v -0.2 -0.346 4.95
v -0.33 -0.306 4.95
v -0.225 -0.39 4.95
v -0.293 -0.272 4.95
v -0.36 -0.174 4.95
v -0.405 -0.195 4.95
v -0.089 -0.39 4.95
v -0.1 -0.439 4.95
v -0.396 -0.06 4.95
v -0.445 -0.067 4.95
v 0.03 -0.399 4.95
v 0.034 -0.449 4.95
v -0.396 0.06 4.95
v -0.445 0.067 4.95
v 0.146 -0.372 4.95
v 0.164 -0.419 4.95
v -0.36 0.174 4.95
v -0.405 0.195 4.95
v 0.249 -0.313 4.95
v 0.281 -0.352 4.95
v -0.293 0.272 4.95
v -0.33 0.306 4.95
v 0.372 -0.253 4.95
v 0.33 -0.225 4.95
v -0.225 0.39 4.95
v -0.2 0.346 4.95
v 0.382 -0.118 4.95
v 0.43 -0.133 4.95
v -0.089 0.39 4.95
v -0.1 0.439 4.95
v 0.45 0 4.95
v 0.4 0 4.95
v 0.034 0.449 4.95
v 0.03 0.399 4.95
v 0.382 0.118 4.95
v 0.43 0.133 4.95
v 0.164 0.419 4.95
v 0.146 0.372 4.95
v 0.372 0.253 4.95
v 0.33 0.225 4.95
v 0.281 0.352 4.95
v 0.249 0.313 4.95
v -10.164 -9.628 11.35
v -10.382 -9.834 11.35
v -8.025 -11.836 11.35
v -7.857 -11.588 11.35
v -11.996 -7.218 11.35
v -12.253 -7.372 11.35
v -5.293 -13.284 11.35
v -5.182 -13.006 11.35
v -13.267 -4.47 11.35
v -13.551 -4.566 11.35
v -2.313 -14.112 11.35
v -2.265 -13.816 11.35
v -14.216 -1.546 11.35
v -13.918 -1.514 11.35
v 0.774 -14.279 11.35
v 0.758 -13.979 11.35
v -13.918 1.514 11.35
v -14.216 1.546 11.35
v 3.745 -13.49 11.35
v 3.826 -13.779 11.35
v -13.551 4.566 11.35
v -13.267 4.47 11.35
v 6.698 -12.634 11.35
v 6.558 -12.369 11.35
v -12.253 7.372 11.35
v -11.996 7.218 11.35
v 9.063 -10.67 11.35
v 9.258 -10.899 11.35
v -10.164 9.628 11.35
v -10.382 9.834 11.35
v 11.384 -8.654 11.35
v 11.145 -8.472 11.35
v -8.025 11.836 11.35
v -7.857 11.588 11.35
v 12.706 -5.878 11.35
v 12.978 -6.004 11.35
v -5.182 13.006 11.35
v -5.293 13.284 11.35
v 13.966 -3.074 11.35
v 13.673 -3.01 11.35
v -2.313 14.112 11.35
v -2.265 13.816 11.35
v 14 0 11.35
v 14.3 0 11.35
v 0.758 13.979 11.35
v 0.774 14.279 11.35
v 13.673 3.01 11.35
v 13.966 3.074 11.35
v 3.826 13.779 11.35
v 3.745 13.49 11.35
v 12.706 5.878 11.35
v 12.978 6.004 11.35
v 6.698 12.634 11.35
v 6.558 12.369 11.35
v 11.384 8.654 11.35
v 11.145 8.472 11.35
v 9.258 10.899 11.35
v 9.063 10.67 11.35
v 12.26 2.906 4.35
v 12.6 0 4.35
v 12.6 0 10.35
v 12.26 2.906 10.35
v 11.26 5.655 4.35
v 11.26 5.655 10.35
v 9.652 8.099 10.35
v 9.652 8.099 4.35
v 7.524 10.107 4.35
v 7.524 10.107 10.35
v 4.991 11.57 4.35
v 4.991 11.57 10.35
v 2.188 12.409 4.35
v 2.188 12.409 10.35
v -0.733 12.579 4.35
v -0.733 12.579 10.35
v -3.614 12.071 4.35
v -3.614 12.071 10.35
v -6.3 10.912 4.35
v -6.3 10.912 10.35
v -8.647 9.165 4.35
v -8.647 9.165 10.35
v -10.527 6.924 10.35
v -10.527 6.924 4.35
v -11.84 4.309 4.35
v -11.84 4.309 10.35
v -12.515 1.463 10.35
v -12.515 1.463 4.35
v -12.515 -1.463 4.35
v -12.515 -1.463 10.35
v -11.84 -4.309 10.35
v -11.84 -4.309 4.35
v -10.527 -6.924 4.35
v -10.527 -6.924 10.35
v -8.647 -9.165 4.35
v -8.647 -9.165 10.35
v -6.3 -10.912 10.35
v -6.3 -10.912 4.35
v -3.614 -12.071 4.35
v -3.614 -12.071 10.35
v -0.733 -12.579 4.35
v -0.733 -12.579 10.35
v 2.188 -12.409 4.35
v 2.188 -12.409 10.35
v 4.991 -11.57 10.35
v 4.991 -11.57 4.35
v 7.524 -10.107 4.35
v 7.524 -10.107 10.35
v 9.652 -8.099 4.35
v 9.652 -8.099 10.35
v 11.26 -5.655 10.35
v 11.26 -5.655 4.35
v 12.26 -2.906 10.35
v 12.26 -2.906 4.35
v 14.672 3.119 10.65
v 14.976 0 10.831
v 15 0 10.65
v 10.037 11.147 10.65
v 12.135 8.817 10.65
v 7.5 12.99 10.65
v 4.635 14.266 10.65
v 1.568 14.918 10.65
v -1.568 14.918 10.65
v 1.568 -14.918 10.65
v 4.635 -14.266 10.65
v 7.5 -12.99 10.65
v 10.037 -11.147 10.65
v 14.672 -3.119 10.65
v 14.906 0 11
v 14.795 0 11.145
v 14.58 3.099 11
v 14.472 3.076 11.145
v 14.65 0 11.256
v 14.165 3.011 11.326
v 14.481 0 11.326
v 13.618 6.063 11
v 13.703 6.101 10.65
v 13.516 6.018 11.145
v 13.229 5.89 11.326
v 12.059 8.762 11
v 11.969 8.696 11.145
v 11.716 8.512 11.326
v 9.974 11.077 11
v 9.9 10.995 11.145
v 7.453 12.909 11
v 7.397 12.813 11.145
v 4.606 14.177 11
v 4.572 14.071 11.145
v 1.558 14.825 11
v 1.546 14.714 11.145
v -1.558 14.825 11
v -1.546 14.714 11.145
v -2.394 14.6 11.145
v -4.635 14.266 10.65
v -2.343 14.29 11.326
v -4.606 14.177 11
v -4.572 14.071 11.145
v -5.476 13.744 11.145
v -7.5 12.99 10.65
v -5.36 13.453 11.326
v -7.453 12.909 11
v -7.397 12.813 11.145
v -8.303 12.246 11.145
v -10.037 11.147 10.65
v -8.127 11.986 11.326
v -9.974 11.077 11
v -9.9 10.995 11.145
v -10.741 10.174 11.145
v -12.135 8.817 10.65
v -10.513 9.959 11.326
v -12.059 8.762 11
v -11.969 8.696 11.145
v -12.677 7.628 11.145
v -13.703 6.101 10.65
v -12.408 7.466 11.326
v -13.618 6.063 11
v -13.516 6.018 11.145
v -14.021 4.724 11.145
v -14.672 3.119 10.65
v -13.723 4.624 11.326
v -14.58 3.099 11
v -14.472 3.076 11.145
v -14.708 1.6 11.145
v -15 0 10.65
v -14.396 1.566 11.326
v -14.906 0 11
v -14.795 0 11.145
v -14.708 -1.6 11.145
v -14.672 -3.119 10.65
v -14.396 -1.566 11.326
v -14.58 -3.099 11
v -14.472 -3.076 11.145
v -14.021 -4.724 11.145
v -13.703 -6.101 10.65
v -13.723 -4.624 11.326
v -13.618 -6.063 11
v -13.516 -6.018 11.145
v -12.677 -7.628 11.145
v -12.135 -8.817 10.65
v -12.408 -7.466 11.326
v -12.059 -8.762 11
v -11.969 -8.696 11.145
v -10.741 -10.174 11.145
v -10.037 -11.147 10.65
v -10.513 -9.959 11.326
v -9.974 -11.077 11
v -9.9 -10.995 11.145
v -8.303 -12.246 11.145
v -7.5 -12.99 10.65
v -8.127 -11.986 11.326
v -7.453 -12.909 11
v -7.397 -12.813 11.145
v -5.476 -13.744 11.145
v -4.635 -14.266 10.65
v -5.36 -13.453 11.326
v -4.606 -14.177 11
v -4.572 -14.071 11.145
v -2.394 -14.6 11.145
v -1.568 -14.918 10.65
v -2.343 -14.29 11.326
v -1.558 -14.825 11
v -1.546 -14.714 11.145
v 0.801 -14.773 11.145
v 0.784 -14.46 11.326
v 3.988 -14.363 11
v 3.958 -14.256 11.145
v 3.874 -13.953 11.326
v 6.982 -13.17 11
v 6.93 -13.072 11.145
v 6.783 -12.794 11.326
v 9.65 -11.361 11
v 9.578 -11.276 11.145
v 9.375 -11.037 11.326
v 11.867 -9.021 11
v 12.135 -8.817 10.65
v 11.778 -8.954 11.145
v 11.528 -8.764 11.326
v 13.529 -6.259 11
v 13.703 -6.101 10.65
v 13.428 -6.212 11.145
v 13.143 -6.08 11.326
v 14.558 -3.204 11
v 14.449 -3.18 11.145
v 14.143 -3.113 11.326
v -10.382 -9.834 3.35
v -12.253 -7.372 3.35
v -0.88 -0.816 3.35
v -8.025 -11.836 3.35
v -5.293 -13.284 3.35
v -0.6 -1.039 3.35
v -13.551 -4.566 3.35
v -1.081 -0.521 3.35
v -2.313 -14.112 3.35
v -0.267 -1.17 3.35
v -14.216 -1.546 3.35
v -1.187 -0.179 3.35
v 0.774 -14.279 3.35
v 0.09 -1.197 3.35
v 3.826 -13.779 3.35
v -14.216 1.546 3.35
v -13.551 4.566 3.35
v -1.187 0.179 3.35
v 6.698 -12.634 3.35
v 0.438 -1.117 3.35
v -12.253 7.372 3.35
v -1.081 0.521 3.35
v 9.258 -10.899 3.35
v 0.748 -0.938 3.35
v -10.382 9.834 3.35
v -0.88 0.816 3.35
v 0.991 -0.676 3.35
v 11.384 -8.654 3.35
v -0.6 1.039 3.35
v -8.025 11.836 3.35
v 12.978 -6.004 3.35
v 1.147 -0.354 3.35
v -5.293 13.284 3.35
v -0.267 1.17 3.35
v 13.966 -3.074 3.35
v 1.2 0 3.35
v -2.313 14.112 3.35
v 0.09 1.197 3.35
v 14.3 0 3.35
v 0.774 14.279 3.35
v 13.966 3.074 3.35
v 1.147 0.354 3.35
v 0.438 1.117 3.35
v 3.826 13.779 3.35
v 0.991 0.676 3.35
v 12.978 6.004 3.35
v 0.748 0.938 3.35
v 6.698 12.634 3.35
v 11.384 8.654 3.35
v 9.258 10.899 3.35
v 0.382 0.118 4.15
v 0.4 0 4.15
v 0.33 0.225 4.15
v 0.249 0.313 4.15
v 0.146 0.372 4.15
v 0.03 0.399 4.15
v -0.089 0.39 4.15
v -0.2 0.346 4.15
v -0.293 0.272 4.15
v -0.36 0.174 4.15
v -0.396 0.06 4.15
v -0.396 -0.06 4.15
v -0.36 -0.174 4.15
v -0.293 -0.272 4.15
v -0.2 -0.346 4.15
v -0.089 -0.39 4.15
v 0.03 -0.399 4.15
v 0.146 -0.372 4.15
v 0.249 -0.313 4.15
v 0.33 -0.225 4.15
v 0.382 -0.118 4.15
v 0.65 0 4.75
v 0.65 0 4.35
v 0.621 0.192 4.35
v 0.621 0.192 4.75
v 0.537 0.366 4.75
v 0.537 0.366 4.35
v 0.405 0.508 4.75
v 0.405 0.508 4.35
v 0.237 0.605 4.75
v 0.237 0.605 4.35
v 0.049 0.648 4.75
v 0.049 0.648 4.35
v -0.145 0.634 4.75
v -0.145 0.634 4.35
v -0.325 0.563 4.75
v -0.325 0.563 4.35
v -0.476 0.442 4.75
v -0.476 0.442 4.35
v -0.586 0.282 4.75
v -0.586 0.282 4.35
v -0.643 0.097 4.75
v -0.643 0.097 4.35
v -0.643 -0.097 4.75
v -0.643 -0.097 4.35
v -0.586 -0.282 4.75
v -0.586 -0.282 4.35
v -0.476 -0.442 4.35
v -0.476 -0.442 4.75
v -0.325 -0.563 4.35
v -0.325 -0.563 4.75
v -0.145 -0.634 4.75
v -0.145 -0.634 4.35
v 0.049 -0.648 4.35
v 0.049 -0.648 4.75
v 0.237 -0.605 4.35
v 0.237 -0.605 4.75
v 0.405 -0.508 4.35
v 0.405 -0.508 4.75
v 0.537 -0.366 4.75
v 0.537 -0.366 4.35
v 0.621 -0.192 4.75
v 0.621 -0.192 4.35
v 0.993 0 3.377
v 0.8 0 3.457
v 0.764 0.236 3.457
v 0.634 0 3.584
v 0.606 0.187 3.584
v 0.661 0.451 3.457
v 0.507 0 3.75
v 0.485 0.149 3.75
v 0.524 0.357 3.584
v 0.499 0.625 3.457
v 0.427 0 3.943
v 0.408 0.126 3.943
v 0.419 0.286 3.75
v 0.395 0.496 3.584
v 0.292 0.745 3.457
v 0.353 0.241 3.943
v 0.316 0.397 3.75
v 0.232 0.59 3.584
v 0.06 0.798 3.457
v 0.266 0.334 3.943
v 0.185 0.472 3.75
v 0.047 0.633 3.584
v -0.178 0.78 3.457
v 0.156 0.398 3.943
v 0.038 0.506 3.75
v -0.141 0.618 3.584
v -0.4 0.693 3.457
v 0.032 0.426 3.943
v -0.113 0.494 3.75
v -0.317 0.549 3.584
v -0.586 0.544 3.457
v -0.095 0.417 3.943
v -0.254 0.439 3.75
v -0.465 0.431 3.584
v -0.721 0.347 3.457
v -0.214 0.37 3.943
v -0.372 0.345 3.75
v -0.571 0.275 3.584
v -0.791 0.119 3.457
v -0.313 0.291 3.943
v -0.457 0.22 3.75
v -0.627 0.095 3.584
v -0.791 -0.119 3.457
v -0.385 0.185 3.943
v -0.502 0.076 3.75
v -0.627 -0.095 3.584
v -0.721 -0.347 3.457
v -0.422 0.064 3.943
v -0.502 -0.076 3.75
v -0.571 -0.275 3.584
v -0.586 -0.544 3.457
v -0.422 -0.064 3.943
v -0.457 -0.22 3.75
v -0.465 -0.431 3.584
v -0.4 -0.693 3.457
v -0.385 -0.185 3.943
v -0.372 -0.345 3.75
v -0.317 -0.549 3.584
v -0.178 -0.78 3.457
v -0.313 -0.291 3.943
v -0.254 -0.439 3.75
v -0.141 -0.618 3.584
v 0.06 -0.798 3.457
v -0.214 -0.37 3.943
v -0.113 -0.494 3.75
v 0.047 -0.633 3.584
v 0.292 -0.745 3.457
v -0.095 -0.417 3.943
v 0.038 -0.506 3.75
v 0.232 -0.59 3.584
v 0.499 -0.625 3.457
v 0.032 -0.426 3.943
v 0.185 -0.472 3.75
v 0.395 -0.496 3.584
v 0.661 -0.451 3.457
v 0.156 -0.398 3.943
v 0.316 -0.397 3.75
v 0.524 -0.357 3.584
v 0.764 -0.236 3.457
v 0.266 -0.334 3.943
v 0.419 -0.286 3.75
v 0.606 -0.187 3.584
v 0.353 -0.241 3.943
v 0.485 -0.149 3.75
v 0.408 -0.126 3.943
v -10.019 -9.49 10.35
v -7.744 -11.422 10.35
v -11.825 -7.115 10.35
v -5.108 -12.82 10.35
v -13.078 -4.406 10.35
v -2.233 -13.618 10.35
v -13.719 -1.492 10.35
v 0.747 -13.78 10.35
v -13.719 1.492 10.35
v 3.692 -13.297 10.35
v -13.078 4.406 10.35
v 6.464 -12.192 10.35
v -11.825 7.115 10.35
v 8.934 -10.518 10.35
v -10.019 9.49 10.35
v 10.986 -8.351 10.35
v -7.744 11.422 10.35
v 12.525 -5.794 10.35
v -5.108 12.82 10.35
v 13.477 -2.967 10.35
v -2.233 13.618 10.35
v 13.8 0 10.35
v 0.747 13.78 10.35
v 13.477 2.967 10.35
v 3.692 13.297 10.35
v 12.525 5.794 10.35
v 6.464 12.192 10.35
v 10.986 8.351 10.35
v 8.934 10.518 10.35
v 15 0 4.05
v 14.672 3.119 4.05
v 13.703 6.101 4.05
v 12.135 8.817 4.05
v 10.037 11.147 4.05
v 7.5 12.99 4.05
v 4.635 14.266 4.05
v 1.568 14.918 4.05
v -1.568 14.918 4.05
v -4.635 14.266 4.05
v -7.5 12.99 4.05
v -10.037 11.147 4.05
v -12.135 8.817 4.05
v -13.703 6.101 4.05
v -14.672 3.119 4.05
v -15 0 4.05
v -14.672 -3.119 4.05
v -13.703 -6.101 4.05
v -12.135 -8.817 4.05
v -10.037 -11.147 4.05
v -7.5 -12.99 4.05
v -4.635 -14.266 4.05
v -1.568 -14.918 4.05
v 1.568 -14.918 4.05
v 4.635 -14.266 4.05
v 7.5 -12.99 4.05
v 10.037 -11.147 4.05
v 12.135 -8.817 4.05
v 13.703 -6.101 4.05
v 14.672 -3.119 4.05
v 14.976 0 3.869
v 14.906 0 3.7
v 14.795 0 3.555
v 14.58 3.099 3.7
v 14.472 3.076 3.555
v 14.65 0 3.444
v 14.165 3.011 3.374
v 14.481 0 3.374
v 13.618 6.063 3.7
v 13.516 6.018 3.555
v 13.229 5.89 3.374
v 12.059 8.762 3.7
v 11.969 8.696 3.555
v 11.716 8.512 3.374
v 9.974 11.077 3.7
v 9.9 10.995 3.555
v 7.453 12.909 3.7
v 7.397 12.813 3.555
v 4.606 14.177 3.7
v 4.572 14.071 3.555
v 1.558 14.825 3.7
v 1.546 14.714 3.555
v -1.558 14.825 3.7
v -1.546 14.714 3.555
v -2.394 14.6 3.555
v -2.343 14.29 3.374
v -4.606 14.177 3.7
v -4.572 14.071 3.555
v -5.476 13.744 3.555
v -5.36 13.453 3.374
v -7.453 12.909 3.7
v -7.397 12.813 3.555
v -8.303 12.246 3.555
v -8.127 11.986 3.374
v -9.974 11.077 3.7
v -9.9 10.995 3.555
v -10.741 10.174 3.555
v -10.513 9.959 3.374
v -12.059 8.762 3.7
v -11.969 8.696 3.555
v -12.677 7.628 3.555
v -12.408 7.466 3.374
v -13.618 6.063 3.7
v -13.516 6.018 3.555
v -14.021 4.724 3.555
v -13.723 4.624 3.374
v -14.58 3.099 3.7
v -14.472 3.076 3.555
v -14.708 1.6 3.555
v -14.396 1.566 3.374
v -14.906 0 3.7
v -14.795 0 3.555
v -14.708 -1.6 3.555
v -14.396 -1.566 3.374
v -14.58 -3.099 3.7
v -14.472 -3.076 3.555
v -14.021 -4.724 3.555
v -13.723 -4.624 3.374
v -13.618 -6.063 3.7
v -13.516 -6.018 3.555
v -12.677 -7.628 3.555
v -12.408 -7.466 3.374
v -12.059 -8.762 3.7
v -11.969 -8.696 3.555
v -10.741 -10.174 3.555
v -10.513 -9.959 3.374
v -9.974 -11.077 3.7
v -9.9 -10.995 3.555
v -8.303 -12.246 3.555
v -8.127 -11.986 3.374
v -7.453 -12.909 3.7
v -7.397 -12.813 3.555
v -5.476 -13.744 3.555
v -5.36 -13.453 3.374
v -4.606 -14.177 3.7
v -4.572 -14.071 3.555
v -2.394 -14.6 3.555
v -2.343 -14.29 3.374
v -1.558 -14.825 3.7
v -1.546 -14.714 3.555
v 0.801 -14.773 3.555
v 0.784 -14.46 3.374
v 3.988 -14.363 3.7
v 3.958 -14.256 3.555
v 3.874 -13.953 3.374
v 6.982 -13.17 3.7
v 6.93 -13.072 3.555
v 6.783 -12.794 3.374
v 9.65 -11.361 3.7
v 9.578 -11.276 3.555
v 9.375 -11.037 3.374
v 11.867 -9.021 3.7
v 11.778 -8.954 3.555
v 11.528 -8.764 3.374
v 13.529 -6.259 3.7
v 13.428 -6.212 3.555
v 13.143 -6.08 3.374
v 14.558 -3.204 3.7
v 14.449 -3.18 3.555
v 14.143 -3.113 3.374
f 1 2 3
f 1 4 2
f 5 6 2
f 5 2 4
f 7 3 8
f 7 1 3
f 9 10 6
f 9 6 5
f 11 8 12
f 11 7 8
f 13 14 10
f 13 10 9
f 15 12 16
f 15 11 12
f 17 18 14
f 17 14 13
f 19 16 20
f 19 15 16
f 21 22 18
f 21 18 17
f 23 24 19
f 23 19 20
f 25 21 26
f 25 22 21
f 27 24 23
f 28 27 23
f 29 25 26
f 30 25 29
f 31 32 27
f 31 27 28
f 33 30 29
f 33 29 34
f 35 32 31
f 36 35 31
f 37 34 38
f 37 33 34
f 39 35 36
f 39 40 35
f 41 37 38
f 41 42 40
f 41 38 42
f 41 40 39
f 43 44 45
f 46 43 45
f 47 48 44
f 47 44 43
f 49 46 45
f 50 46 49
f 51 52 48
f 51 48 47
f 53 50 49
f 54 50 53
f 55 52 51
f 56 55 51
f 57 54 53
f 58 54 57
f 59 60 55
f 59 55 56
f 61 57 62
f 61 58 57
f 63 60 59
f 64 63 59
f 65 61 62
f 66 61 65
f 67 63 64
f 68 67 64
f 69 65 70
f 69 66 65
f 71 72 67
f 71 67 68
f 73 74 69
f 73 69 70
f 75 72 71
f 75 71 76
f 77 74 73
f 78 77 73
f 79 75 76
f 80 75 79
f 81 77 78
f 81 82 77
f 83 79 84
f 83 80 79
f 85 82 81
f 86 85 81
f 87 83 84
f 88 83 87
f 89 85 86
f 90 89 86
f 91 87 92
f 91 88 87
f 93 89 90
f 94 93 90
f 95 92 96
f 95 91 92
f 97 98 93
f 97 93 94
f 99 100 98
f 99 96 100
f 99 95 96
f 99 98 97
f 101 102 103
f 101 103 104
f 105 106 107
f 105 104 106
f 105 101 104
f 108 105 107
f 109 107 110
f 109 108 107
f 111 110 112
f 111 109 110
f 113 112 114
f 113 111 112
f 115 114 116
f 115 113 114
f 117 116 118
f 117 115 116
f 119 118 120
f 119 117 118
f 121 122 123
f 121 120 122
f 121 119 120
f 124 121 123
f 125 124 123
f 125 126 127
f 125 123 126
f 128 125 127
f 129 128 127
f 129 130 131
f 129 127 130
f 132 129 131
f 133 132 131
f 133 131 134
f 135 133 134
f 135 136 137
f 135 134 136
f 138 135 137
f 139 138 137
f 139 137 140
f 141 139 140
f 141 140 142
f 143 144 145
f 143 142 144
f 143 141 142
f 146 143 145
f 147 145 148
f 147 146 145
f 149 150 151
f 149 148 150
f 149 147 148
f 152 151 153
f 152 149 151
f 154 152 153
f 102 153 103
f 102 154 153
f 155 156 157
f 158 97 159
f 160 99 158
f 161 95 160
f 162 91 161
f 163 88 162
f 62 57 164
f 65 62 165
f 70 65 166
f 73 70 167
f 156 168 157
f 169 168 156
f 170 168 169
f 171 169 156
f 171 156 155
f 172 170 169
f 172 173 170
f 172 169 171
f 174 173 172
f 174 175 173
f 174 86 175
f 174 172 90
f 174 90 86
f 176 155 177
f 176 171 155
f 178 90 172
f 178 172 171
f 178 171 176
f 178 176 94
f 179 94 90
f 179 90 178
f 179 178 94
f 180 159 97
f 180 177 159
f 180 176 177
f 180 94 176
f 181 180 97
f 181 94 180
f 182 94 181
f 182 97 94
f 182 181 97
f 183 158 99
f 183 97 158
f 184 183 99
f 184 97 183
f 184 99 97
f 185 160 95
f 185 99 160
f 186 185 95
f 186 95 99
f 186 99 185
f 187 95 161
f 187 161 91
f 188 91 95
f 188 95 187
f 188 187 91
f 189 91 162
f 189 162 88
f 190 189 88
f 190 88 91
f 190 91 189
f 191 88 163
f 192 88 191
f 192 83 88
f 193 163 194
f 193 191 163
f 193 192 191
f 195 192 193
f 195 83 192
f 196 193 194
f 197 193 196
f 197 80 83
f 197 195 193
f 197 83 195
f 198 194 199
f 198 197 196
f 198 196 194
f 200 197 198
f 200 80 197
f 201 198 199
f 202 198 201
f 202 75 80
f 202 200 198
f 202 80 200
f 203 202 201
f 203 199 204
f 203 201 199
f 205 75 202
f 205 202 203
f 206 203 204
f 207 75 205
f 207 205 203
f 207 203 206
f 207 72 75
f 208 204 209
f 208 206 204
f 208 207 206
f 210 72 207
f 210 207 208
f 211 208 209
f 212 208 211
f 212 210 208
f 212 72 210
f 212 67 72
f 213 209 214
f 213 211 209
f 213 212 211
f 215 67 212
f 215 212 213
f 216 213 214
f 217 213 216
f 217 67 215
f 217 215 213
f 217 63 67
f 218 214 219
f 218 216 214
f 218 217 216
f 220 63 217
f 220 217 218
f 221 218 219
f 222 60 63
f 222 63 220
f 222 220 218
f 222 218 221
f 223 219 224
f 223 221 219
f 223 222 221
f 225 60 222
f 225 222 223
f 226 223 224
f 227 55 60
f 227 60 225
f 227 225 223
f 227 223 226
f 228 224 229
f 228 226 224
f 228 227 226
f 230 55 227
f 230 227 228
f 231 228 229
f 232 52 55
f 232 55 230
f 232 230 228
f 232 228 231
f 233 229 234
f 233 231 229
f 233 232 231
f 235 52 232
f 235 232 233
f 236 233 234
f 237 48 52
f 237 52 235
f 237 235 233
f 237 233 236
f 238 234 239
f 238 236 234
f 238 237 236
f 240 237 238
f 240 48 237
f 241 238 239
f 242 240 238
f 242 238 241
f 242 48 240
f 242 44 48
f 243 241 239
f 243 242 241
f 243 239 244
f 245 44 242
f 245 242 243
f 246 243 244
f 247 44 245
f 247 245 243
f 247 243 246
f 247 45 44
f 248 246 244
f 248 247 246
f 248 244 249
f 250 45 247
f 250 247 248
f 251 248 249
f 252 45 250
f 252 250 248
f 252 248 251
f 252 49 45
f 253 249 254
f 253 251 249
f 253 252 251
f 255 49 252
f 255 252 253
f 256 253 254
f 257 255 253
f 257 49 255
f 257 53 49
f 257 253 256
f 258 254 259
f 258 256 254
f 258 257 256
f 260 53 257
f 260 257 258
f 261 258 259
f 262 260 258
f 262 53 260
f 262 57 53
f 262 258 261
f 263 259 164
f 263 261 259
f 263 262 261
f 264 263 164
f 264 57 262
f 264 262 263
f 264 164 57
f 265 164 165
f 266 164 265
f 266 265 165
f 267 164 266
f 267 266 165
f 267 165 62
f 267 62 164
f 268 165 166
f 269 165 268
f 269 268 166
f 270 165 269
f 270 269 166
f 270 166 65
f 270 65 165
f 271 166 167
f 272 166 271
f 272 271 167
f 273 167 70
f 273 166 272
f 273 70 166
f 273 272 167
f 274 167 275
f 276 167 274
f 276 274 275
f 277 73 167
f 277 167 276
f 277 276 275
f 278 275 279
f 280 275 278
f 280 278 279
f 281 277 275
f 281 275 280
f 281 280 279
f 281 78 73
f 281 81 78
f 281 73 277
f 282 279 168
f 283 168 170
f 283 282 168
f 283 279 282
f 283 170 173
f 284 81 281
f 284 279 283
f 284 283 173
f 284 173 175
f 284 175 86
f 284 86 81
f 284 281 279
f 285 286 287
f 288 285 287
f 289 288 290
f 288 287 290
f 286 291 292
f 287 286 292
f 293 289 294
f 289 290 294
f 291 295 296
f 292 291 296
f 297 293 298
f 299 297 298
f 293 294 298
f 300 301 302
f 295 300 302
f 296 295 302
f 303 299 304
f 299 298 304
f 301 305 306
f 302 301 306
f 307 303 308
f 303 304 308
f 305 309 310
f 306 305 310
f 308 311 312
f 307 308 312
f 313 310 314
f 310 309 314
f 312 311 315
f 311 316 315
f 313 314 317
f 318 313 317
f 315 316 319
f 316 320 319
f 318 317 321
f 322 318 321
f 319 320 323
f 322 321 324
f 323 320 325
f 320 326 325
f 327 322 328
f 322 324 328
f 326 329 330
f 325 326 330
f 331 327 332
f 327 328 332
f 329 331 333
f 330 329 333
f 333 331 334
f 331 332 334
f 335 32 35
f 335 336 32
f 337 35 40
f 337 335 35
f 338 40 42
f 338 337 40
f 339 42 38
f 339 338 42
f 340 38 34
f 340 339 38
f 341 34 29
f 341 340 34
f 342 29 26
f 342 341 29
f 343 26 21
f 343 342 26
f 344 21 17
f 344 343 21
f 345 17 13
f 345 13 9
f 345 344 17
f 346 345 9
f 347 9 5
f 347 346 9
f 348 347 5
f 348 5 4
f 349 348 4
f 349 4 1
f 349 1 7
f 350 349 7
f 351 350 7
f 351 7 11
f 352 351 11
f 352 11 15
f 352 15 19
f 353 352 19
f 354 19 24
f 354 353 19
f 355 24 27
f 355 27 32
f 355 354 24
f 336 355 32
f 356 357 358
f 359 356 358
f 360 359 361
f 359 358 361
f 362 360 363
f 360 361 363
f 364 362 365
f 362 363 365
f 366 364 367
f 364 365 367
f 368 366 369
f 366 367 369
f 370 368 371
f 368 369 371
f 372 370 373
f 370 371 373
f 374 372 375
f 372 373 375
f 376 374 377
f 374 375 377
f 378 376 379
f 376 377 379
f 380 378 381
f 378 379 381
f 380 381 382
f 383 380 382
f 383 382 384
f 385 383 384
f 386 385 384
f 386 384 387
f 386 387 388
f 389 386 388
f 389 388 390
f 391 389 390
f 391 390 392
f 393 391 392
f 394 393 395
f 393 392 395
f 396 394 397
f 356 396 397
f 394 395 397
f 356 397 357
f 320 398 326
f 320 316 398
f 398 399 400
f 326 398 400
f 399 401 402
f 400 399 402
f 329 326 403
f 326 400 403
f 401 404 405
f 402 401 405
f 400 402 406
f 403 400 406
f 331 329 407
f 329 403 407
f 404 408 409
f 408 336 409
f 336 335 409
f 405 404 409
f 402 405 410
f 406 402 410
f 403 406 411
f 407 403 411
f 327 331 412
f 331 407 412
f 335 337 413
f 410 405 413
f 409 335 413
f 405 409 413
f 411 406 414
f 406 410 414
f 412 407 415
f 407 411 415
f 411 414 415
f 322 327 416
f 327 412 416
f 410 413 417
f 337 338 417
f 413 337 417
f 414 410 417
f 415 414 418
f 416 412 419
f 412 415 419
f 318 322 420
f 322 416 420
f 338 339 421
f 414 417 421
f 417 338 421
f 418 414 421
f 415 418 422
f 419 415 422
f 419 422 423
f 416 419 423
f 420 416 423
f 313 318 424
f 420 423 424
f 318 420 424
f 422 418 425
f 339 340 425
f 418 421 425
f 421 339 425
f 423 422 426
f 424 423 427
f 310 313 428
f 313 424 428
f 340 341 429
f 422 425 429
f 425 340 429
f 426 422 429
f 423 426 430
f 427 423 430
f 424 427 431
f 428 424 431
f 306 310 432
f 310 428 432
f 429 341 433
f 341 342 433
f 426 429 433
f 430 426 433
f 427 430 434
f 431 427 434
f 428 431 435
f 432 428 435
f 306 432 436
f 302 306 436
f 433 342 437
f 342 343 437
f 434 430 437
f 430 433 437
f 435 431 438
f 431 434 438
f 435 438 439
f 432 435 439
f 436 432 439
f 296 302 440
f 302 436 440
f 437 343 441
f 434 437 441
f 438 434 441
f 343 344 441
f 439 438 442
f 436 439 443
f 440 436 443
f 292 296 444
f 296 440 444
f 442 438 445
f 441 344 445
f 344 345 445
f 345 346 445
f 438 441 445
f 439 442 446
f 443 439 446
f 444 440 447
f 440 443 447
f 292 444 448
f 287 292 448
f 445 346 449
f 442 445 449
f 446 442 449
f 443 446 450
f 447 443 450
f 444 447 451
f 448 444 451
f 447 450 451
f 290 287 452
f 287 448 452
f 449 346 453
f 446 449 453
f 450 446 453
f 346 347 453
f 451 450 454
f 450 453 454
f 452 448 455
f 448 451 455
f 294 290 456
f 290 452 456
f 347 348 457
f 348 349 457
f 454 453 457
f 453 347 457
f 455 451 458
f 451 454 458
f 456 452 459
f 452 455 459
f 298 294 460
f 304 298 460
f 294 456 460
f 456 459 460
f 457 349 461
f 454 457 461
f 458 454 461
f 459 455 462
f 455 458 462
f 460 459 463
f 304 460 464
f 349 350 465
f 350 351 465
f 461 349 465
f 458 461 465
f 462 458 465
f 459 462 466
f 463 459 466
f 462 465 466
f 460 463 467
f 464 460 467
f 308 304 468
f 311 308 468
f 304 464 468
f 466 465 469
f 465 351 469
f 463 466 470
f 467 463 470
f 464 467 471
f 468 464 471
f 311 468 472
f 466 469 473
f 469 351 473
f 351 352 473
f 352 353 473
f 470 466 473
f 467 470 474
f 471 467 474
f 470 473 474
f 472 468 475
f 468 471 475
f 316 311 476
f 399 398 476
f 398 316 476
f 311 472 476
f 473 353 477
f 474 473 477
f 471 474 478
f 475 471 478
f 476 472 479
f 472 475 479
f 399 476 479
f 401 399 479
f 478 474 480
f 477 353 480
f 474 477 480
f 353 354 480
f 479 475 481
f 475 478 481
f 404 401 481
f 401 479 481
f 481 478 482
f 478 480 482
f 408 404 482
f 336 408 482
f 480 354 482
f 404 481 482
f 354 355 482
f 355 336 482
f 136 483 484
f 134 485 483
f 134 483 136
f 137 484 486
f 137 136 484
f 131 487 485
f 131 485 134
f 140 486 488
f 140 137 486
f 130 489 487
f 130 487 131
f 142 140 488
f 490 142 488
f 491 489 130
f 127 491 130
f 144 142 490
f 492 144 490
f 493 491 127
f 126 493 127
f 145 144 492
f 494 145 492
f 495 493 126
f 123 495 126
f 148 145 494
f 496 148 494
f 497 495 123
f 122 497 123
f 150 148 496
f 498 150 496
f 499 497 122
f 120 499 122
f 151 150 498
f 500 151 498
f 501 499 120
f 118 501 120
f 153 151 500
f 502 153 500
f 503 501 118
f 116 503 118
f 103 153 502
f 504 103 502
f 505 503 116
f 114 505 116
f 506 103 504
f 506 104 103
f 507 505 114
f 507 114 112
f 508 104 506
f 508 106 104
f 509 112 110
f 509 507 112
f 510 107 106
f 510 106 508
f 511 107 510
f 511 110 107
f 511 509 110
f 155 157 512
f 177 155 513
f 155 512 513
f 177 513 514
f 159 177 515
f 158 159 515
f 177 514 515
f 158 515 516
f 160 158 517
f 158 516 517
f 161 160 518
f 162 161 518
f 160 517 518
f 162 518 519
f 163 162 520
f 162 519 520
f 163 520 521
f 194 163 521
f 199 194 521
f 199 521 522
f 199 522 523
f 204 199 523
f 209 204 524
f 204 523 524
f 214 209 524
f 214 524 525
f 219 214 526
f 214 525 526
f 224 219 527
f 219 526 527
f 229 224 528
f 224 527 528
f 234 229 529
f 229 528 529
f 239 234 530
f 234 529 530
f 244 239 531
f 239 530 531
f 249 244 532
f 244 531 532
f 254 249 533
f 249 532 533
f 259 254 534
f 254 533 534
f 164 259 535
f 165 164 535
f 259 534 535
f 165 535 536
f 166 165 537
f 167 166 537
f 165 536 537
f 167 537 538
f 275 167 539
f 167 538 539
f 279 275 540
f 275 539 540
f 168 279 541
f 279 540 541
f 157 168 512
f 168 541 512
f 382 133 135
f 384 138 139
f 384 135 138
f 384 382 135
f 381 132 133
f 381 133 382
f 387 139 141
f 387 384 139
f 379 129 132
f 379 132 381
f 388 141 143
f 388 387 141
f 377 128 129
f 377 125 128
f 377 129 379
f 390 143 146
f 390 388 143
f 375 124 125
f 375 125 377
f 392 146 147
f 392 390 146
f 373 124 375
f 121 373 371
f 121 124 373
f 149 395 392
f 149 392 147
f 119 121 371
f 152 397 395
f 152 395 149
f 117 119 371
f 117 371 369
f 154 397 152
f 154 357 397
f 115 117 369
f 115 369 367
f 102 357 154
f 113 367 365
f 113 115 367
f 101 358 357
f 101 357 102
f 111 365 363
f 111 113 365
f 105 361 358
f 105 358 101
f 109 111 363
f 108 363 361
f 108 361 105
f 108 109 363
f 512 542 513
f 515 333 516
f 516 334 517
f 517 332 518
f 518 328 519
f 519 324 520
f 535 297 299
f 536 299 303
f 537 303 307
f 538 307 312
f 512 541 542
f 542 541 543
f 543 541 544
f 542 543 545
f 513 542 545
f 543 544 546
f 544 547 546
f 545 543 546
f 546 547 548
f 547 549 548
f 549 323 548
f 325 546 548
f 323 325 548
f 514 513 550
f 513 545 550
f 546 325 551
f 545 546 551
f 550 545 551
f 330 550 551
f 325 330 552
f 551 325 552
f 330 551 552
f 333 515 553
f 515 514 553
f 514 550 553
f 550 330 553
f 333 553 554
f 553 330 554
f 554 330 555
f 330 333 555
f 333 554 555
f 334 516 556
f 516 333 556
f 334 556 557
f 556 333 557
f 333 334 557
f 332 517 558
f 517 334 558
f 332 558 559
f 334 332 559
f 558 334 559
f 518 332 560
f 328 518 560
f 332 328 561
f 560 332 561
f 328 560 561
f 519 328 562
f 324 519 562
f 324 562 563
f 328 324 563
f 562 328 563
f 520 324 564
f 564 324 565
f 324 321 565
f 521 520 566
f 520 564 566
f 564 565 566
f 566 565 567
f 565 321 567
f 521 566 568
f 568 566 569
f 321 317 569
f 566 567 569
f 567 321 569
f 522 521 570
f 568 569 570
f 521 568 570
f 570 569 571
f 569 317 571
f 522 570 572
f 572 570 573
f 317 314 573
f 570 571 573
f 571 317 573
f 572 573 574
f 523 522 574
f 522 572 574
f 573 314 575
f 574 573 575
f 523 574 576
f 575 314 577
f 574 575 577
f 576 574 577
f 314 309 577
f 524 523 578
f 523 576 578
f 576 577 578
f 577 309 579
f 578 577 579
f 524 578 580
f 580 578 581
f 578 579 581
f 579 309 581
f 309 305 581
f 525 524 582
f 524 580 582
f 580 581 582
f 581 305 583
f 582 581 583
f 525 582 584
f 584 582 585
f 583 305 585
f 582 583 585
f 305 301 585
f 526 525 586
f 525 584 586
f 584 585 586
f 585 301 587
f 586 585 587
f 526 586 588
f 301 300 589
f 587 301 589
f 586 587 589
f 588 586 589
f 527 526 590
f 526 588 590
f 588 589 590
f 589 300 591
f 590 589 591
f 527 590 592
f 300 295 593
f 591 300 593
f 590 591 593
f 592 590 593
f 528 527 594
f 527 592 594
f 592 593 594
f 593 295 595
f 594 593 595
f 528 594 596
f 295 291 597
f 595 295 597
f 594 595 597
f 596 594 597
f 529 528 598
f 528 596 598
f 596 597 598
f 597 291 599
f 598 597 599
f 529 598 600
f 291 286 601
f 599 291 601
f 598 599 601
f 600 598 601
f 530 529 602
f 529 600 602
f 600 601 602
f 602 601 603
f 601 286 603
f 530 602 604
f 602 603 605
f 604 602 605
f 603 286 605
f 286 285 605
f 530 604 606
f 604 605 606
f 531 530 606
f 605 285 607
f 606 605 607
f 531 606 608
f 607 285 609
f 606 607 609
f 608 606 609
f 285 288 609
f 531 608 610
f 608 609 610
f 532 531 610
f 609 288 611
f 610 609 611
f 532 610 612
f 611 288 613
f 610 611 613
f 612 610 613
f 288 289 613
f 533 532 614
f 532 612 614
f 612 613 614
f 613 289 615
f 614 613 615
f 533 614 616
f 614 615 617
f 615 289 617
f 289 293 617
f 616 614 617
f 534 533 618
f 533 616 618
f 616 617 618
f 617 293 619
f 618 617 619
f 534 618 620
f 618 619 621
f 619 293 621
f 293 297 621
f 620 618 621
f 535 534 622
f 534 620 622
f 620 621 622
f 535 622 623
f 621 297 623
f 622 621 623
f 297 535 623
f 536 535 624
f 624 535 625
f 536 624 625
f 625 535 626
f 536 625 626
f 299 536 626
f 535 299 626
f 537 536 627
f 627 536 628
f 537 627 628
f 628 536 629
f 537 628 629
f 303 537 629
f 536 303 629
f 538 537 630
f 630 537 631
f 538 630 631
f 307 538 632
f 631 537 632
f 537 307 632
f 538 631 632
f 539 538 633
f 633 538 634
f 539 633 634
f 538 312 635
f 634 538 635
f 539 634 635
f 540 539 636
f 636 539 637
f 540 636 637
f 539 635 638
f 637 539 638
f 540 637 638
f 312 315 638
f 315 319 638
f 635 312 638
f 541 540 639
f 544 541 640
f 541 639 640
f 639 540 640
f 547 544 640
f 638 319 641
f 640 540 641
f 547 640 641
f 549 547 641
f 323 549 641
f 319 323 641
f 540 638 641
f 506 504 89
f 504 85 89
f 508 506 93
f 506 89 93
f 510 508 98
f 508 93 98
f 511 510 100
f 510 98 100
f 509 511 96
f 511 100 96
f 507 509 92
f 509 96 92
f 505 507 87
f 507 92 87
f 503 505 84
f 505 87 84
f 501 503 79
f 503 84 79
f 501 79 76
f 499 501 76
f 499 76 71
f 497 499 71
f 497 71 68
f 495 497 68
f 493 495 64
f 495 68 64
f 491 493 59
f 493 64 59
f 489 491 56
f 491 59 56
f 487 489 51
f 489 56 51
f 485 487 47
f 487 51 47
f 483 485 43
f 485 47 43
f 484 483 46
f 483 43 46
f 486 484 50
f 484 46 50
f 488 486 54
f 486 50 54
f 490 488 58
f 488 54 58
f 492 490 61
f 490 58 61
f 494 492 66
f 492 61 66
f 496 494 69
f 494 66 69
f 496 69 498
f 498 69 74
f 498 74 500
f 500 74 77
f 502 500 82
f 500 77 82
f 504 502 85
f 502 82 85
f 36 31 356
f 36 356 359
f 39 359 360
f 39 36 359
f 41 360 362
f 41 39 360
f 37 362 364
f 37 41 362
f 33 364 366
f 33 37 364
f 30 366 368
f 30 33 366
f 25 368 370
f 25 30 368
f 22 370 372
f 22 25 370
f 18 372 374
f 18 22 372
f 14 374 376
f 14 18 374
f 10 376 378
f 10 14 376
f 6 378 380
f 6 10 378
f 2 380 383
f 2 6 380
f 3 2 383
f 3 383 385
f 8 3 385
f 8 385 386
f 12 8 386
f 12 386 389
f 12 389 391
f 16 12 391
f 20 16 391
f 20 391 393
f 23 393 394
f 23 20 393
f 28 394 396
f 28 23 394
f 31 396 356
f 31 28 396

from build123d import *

# Parameters (mm, degrees)
CYLINDER006_R     = 14
CYLINDER006_DEPTH = 1
CYLINDER005_R     = 0.4
CYLINDER005_DEPTH = 1
CYLINDER001_R     = 12.6
CYLINDER001_DEPTH = 8
CYLINDER_R        = 15
CYLINDER_DEPTH    = 8
CYLINDER002_R     = 15
CYLINDER002_DEPTH = 1
FILLET_R          = 0.7
FILLET001_R       = 0.7
FILLET002_R       = 0.8
CYLINDER004_R     = 0.4
CYLINDER004_DEPTH = 0.6
CYLINDER003_R     = 0.65
CYLINDER003_DEPTH = 0.6
CHAMFER_SIZE      = 0.2
CYLINDER007_R     = 14
CYLINDER007_DEPTH = 1


with BuildPart() as cylinder006:
    # Cylinder006 → Cylinder006 (new body)
    with BuildSketch(Plane.XY.offset(7)):
        Circle(CYLINDER006_R)
    extrude(amount=CYLINDER006_DEPTH)


with BuildPart() as cylinder005:
    # Cylinder005 → Cylinder005 (new body)
    with BuildSketch(Plane.XY):
        Circle(CYLINDER005_R)
    extrude(amount=CYLINDER005_DEPTH)


with BuildPart() as cylinder001:
    # Cylinder001 → Cylinder001 (new body)
    with BuildSketch(Plane.XY):
        Circle(CYLINDER001_R)
    extrude(amount=CYLINDER001_DEPTH)


with BuildPart() as cut:
    # Cylinder → Cylinder (new body)
    with BuildSketch(Plane.XY):
        Circle(CYLINDER_R)
    extrude(amount=CYLINDER_DEPTH)

    # Cut: cut Cylinder001
    add(cylinder001.part, mode=Mode.SUBTRACT)


with BuildPart() as fillet002:
    # Cylinder002 → Cylinder002 (new body)
    with BuildSketch(Plane.XY):
        Circle(CYLINDER002_R)
    extrude(amount=CYLINDER002_DEPTH)

    # Fusion: union Cut
    add(cut.part)

    # Cut001: cut Cylinder005
    add(cylinder005.part, mode=Mode.SUBTRACT)

    # Cut003: cut Cylinder006
    add(cylinder006.part, mode=Mode.SUBTRACT)

    # Fillet
    fillet_edges = [fillet002.edges().sort_by_distance(p)[0] for p in [
        (-15, 0, 8),
    ]]
    fillet(fillet_edges, radius=FILLET_R)

    # Fillet001
    fillet001_edges = [fillet002.edges().sort_by_distance(p)[0] for p in [
        (-15, 0, 0),
    ]]
    fillet(fillet001_edges, radius=FILLET001_R)

    # Fillet002
    fillet002_edges = [fillet002.edges().sort_by_distance(p)[0] for p in [
        (-0.4, 0, 0),
    ]]
    fillet(fillet002_edges, radius=FILLET002_R)


with BuildPart() as cylinder004:
    # Cylinder004 → Cylinder004 (new body)
    with BuildSketch(Plane.XY.offset(1)):
        Circle(CYLINDER004_R)
    extrude(amount=CYLINDER004_DEPTH)


with BuildPart() as chamfer_body:
    # Cylinder003 → Cylinder003 (new body)
    with BuildSketch(Plane.XY.offset(1)):
        Circle(CYLINDER003_R)
    extrude(amount=CYLINDER003_DEPTH)

    # Cut002: cut Cylinder004
    add(cylinder004.part, mode=Mode.SUBTRACT)

    # Chamfer
    chamfer_edges = [chamfer_body.edges().sort_by_distance(p)[0] for p in [
        (-0.65, 0, 1.6),
    ]]
    chamfer(chamfer_edges, length=CHAMFER_SIZE)


with BuildPart() as cone:
    # Cone → Cone (revolve)
    with BuildSketch(Plane(origin=(0, 0, 7), x_dir=(1, 0, 0), z_dir=(0, -1, 0))):
        Polygon((0, 0), (13.8, 0), (14, 1), (0, 1), align=None)
    revolve(axis=Axis((0, 0, 7), (0, 0, 1)))


with BuildPart() as fusion001:
    # Cylinder007 → Cylinder007 (new body)
    with BuildSketch(Plane.XY.offset(7)):
        Circle(CYLINDER007_R)
    extrude(amount=CYLINDER007_DEPTH)

    # Cut004: cut Cone
    add(cone.part, mode=Mode.SUBTRACT)

    # Fusion001: union Fillet002, Chamfer body
    add(fillet002.part)
    add(chamfer_body.part)


with BuildPart() as fusion001_1:
    # Fusion001 placement: moved
    add(fusion001.part.moved(Location((0, 0, 3.35))))


solid = fusion001_1.part
